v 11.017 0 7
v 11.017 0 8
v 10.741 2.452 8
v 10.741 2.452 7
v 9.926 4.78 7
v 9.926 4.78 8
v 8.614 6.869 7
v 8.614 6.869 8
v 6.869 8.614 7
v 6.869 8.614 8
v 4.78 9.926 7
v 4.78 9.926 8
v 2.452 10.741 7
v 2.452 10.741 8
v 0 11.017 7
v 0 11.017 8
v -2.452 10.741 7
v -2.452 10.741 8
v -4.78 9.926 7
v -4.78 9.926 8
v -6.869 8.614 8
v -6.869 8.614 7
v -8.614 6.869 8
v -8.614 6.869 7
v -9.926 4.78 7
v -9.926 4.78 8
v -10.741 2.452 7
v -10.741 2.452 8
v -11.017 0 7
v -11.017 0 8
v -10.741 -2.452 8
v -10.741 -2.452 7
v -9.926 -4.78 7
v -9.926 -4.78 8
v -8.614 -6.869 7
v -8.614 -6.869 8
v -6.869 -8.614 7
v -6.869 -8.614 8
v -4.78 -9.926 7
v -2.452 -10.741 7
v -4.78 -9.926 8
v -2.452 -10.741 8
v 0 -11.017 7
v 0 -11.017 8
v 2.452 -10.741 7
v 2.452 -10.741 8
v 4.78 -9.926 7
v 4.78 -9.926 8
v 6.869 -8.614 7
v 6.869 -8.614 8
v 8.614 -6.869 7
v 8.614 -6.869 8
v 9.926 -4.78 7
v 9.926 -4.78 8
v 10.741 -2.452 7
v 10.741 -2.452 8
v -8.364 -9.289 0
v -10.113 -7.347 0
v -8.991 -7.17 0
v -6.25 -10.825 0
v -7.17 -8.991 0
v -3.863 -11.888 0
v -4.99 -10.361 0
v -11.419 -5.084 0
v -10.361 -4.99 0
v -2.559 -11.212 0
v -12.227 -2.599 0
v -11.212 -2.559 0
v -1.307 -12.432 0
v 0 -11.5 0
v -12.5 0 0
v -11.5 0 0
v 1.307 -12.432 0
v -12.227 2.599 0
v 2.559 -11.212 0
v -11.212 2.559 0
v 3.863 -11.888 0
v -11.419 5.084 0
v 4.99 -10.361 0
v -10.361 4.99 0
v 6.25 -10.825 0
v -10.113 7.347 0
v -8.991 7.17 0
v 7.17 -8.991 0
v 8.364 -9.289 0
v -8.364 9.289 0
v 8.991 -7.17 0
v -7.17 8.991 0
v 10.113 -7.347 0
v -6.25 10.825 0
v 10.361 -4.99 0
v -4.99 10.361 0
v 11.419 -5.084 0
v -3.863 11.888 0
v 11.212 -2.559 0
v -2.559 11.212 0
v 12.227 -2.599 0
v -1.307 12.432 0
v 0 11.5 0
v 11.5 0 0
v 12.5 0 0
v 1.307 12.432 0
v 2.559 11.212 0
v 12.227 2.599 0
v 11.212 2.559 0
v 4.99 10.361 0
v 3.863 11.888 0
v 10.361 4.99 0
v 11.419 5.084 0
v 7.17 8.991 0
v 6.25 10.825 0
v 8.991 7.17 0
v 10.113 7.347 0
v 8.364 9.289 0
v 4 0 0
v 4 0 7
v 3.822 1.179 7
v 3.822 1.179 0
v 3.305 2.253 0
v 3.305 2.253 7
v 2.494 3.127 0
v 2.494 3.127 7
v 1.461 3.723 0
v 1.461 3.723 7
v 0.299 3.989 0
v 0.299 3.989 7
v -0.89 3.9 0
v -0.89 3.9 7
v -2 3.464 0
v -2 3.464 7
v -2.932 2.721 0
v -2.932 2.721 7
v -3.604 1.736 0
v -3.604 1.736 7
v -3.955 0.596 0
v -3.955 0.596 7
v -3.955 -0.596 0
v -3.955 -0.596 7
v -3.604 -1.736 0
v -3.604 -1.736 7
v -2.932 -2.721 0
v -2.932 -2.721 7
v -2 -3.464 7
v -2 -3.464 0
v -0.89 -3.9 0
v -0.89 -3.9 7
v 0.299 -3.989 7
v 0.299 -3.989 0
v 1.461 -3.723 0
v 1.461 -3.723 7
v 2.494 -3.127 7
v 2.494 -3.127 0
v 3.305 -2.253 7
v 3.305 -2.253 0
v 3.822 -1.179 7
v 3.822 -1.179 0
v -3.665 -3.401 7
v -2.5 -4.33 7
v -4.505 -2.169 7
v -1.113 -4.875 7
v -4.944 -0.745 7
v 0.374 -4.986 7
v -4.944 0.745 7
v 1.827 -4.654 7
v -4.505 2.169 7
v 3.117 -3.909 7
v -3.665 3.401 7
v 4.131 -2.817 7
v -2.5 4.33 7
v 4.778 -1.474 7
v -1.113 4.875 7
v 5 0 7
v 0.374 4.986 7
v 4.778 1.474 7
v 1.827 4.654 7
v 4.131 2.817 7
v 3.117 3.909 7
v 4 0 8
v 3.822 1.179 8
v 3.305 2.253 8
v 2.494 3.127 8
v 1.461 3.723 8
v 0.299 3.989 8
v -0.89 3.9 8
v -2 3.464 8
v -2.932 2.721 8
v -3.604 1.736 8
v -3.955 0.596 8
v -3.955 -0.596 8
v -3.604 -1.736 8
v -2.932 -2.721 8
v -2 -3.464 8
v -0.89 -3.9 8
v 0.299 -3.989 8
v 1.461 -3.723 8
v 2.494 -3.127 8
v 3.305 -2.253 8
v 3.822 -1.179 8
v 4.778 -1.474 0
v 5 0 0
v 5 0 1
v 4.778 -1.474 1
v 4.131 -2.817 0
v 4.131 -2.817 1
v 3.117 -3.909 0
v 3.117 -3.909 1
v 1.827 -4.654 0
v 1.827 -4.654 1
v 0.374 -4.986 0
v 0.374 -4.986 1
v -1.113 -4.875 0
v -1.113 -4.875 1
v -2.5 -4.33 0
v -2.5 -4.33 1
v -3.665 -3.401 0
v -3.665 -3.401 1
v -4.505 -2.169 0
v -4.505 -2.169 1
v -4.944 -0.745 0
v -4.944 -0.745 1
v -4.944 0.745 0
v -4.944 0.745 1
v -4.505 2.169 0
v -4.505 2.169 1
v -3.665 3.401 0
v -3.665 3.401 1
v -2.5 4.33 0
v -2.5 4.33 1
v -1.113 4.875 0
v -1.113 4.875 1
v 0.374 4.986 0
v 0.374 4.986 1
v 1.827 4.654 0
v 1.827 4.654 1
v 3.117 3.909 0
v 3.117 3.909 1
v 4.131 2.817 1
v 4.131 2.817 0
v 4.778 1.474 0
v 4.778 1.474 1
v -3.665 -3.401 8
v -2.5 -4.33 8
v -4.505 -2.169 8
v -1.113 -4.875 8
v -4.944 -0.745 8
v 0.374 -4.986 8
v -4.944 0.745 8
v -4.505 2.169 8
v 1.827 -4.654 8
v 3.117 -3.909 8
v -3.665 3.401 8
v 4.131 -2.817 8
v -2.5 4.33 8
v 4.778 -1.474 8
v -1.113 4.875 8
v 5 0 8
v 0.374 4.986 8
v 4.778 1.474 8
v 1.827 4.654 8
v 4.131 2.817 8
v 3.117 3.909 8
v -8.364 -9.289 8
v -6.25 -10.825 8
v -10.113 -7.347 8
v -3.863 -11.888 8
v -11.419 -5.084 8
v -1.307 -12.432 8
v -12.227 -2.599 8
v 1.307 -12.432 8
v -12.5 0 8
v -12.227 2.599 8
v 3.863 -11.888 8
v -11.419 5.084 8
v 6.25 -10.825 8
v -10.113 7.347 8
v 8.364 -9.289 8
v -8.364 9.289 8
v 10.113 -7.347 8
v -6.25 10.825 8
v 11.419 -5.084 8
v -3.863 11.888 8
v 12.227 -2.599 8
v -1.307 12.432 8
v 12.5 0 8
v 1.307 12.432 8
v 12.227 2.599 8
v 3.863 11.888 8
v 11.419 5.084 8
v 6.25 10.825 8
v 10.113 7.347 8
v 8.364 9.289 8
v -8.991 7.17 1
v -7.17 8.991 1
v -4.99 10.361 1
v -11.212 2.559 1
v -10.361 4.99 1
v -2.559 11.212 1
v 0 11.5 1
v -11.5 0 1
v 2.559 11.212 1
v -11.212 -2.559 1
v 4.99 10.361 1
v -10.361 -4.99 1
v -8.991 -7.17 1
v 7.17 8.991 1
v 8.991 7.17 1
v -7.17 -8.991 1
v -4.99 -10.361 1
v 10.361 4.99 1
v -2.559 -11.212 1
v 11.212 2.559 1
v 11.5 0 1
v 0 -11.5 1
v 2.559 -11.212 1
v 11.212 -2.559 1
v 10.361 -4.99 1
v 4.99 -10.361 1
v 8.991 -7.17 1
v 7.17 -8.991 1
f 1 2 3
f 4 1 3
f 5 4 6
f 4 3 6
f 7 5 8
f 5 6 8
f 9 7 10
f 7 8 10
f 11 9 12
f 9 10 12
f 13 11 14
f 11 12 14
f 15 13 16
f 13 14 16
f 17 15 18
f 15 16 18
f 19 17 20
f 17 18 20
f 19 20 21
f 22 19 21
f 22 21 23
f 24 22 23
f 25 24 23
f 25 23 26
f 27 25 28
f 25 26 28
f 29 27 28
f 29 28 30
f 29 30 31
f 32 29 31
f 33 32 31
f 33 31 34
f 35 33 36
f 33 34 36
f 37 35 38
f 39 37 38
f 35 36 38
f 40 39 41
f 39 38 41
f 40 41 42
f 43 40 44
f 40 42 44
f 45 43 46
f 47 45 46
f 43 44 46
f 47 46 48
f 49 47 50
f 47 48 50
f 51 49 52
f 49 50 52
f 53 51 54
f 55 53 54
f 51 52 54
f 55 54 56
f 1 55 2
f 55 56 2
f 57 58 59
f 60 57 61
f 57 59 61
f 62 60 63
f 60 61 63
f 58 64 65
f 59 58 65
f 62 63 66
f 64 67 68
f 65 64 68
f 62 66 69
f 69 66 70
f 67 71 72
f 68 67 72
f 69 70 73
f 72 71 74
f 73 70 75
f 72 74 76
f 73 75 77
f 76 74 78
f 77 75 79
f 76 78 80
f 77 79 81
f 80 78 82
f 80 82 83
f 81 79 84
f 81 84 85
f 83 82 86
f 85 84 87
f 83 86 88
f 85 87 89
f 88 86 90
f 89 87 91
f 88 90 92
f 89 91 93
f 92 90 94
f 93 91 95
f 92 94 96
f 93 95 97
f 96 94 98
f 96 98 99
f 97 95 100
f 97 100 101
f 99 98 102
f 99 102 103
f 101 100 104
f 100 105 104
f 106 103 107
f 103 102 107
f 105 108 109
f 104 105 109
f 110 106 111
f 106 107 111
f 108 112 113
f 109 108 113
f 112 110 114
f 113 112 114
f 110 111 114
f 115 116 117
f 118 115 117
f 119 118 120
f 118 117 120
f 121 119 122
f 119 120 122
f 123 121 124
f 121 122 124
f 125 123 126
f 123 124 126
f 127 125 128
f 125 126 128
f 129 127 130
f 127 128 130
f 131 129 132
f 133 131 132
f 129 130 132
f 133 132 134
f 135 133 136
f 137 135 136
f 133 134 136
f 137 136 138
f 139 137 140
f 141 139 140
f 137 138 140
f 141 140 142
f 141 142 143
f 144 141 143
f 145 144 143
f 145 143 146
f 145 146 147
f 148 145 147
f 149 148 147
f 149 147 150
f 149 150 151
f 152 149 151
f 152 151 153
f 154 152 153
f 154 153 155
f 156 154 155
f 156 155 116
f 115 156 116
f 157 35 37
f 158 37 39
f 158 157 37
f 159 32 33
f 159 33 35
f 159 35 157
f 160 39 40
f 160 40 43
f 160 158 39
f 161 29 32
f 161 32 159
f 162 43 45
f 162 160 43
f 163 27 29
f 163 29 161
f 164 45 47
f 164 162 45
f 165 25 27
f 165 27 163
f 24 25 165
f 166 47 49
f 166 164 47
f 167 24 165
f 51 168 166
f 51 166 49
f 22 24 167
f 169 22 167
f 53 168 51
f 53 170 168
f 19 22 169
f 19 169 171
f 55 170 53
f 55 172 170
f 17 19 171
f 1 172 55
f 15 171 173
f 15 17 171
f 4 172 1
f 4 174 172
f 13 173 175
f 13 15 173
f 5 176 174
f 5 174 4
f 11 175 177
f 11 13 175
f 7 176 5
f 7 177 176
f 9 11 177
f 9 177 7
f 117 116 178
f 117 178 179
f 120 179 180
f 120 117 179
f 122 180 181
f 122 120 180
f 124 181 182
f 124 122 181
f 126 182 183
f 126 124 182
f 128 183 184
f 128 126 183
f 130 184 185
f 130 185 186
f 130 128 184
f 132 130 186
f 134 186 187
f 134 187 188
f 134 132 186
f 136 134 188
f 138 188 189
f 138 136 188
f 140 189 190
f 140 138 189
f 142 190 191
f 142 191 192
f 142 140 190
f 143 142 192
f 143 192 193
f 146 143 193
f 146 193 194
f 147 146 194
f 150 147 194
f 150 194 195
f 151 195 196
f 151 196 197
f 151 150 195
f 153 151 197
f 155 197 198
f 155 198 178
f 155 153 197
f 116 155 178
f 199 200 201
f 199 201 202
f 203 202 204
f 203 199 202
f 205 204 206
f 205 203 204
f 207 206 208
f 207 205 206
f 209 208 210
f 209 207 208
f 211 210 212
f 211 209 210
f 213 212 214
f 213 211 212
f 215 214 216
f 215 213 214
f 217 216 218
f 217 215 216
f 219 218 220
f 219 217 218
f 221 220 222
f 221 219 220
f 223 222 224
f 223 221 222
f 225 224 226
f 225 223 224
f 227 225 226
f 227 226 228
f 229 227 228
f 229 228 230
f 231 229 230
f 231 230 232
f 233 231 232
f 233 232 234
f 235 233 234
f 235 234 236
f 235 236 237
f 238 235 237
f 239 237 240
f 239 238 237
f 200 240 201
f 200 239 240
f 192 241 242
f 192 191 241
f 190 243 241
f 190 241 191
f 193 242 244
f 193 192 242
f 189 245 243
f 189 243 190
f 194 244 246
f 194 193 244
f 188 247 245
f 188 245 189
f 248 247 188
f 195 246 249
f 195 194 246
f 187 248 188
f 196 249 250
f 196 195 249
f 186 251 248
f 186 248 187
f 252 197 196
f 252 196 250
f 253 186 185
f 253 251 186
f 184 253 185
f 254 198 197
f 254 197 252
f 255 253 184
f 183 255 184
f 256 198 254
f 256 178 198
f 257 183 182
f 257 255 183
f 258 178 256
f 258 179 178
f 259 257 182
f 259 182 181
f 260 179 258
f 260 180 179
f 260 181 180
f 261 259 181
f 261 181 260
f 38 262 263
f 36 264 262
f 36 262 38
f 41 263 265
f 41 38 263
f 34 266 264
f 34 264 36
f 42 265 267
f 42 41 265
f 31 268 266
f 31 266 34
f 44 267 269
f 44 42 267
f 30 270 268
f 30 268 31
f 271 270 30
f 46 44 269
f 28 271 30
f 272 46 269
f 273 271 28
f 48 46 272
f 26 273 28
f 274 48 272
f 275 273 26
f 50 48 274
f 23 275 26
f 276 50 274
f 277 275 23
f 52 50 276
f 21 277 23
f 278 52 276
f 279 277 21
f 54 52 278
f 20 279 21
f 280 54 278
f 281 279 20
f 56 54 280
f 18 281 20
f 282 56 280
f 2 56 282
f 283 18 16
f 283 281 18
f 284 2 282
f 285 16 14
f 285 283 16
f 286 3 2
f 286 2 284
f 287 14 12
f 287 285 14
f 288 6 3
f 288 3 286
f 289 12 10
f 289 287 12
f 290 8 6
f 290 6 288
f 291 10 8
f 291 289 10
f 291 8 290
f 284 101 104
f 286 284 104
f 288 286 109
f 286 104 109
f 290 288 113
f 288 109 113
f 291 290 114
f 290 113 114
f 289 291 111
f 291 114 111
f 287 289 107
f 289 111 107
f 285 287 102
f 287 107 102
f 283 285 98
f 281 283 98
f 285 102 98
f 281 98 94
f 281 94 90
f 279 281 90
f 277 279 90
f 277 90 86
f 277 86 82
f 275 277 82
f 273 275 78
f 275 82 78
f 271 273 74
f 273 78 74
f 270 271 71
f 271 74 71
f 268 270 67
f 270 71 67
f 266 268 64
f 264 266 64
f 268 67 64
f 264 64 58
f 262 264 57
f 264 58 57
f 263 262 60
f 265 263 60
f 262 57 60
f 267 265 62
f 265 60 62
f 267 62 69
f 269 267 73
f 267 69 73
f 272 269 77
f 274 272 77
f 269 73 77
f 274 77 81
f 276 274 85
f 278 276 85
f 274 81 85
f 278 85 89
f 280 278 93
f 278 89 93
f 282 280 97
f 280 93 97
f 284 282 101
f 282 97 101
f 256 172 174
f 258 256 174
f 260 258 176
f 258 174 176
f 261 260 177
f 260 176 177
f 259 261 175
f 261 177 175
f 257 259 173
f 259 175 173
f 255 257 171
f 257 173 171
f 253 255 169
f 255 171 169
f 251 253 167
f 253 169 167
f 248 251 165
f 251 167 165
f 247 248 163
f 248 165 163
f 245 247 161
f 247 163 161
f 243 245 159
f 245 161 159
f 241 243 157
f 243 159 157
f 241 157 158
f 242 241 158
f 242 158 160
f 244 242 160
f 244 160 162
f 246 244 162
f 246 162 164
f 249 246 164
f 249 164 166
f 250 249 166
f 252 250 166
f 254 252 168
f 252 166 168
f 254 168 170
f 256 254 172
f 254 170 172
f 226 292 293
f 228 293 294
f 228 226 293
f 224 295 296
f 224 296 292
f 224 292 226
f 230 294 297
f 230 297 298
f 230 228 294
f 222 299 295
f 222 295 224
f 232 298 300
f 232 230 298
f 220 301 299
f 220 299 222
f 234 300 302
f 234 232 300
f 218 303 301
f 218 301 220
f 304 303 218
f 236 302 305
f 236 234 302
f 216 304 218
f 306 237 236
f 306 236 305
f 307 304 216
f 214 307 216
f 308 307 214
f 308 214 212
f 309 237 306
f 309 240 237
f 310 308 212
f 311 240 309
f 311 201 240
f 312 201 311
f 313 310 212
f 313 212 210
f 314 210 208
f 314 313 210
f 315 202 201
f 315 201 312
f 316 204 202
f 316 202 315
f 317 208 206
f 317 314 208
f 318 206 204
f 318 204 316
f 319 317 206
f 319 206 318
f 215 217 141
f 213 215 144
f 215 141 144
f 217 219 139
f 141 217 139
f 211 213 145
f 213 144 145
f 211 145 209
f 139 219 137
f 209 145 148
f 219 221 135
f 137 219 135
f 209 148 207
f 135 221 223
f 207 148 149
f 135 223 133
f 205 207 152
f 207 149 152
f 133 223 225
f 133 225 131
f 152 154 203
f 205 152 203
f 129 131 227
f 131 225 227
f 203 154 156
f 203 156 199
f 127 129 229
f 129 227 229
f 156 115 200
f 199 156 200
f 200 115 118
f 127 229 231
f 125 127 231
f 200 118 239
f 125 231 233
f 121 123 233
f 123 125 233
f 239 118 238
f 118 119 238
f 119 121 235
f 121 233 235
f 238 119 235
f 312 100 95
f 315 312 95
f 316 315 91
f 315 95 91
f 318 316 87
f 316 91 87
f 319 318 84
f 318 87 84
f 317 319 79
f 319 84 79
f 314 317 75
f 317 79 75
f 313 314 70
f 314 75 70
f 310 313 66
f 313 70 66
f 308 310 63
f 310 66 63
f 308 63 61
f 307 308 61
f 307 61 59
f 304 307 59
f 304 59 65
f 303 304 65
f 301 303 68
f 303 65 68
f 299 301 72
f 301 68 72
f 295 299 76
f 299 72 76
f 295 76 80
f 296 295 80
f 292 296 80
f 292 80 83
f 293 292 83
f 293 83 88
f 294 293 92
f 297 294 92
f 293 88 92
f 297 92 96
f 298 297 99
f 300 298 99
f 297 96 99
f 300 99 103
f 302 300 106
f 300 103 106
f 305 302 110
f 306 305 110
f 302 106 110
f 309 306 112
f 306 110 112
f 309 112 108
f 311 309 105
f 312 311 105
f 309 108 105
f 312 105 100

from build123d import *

# Parameters (mm, degrees)
F0_R      = 12.5
F0_R_2    = 11.5
F1_DEPTH  = 8
F3_R      = 4
F4_DEPTH  = 8.001
F2_R      = 11.0174189911
F5_DEPTH  = 1
F6_R      = 5
F6_R_2    = 4
F7_DEPTH  = 1
F9_R      = 270.8400585349
F9_R_2    = 127
F10_DEPTH = 1
F11_R     = 11.5
F11_R_2   = 5
F12_DEPTH = 1


with BuildPart() as f1:
    # F0 (on Top) → F1 (new body)
    with BuildSketch(Plane.XY):
        Circle(F0_R)
        Circle(F0_R_2, mode=Mode.SUBTRACT)
        Circle(F0_R_2)
    extrude(amount=F1_DEPTH)

    # F3 (on face) → F4 (cut, through all)
    with BuildSketch(Plane.XY.offset(8)):
        Circle(F3_R)
    extrude(amount=-F4_DEPTH, mode=Mode.SUBTRACT)

    # F2 (on face) → F5 (cut)
    with BuildSketch(Plane.XY.offset(8)):
        Circle(F2_R)
    extrude(amount=-F5_DEPTH, mode=Mode.SUBTRACT)

    # F6 (on face) → F7 (join)
    with BuildSketch(Plane.XY.offset(7)):
        Circle(F6_R)
        Circle(F6_R_2, mode=Mode.SUBTRACT)
    extrude(amount=F7_DEPTH)

    # F9 (on face) → F10 (cut)
    with BuildSketch(Plane(origin=(0, 0, 0), x_dir=(1, 0, 0), z_dir=(0, 0, -1))):
        Circle(F9_R)
        Circle(F9_R_2, mode=Mode.SUBTRACT)
    extrude(amount=-F10_DEPTH, mode=Mode.SUBTRACT)

    # F11 (on face) → F12 (cut)
    with BuildSketch(Plane(origin=(0, 0, 0), x_dir=(1, 0, 0), z_dir=(0, 0, -1))):
        Circle(F11_R)
        Circle(F11_R_2, mode=Mode.SUBTRACT)
    extrude(amount=-F12_DEPTH, mode=Mode.SUBTRACT)


solid = f1.part
